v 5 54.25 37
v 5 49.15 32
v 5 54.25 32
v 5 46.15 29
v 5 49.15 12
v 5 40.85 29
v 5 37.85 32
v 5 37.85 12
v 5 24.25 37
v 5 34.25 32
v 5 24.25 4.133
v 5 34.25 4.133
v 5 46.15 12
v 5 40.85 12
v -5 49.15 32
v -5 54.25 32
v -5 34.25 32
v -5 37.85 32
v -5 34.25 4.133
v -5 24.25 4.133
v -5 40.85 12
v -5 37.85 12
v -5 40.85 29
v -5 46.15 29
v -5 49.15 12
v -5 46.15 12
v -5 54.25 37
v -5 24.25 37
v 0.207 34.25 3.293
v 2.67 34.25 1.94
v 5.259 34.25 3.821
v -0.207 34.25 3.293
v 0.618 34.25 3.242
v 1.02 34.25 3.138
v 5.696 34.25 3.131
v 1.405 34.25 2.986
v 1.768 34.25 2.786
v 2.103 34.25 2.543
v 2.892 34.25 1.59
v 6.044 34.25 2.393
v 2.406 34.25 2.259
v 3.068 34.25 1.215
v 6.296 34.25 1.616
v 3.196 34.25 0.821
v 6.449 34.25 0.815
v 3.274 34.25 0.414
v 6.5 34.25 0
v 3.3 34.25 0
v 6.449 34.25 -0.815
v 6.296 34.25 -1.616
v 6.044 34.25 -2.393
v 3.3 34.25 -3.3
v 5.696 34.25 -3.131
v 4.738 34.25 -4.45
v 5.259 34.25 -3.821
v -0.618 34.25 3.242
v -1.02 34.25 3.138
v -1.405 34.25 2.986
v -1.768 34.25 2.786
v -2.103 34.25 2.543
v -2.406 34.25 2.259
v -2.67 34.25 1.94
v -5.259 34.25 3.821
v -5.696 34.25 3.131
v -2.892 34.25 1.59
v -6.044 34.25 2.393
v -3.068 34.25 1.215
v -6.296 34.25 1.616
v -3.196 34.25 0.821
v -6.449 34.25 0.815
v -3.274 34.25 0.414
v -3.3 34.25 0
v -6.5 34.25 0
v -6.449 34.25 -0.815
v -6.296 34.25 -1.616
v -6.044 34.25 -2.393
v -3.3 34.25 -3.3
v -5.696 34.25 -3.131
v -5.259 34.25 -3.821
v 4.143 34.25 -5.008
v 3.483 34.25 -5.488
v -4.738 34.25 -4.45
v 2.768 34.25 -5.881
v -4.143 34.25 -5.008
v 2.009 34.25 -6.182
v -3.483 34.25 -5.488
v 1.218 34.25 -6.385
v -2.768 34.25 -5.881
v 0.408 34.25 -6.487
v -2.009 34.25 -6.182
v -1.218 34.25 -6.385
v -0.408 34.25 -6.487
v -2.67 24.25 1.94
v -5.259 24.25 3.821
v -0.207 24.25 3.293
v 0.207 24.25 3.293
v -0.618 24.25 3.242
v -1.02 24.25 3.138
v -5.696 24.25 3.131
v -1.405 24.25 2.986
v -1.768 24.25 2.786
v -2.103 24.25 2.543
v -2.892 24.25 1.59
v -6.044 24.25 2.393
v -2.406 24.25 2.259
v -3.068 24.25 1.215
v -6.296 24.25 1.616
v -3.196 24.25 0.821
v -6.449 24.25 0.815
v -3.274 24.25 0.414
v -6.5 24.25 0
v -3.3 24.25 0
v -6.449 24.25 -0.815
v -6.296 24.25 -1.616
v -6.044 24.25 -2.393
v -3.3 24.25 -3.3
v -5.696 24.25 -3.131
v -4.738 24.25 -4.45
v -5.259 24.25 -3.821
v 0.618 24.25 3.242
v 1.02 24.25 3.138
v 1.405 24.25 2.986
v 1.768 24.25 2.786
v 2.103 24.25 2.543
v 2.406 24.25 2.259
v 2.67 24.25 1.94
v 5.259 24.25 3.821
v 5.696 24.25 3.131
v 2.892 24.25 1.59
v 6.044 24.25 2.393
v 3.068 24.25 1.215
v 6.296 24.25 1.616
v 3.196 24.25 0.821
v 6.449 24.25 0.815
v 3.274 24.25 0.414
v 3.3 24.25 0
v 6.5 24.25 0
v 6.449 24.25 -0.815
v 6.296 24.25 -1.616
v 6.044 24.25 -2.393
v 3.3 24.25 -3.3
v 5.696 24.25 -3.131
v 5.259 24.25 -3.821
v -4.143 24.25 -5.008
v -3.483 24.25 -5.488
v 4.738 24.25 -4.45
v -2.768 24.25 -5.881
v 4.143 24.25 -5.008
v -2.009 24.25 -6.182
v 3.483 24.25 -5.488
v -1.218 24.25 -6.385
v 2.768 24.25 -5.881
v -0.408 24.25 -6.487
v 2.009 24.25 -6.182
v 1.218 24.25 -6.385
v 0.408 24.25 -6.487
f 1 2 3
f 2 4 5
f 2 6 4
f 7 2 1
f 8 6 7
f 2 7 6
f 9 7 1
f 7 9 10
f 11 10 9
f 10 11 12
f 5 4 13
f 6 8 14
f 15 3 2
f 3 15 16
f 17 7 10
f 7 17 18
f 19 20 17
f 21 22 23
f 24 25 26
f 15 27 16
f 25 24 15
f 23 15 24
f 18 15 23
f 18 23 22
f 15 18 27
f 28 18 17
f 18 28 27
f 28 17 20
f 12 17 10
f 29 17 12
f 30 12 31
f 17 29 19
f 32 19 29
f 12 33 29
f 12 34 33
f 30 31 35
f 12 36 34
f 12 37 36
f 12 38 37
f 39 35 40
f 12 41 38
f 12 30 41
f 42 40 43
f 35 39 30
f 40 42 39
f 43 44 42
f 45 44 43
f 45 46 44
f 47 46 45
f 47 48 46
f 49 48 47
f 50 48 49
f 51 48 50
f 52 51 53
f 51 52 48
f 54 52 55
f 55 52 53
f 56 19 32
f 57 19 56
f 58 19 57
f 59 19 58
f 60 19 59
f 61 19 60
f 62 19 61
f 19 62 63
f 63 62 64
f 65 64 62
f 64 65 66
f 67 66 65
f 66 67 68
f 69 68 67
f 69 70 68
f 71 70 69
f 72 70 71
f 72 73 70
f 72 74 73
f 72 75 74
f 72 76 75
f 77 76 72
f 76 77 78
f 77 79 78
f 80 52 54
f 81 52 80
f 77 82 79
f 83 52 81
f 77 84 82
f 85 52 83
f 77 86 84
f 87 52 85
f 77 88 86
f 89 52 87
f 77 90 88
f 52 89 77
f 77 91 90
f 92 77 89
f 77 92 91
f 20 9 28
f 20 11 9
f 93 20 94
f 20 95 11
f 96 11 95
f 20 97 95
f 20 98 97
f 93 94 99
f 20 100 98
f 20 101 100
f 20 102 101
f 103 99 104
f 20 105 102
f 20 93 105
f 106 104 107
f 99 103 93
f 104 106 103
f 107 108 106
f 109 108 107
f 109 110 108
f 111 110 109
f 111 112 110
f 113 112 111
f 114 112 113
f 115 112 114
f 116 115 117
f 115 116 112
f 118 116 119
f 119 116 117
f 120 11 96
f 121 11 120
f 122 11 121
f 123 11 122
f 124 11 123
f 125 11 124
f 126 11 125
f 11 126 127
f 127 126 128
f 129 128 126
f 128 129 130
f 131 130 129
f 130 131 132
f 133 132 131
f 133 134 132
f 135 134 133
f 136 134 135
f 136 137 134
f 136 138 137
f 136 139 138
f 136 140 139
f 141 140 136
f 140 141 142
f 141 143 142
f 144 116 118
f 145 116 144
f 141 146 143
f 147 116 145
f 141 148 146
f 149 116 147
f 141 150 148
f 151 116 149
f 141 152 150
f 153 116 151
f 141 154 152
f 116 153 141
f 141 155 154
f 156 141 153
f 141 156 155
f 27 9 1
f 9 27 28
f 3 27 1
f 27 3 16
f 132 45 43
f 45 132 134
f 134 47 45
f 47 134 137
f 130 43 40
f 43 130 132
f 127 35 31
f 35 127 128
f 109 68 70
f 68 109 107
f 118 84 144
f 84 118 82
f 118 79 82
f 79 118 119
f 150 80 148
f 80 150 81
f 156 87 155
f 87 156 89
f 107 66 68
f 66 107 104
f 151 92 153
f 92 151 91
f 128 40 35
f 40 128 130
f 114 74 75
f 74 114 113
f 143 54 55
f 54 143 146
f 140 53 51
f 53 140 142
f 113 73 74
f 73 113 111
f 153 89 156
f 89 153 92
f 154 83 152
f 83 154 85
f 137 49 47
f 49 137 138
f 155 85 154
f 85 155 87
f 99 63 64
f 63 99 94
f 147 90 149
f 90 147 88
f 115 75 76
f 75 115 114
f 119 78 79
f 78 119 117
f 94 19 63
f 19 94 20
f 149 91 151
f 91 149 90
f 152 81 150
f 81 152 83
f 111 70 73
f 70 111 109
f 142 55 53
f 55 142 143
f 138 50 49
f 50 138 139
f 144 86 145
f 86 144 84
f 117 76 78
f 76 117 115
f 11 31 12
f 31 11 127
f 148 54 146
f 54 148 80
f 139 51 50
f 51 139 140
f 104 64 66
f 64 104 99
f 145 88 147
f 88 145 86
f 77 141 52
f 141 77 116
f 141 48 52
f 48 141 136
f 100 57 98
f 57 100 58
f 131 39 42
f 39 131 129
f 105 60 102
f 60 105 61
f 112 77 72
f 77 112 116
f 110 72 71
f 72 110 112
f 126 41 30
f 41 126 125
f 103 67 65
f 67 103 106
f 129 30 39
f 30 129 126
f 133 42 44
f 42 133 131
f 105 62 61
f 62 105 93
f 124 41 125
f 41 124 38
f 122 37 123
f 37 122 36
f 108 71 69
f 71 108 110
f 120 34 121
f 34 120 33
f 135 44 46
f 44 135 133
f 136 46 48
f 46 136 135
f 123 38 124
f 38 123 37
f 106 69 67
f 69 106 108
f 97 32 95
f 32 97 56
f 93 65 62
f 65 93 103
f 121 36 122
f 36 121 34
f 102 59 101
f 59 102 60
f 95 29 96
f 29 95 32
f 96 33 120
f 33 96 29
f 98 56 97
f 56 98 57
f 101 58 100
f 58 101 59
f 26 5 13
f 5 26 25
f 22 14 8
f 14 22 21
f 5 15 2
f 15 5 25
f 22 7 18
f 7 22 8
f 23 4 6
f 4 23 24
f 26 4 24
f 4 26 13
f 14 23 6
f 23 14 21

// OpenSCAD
$fn = 50;

gap = 1;
wall = 3;
electrode_sz_z = 32;

max_sz_y = 86.5;

h=max_sz_y - 2 * wall - 2 * gap - 10;

int_d = 2;
ext_d = int_d + 4;

holder_d = ext_d + 2 * wall + gap;
holder_sz_y = 10;

module isolat(extra_d=0) {
  d = ext_d+extra_d;
  rotate([90, 0, 0]) {
    difference() {
      union() {
        cylinder(d=d, h=h, center=true);
        translate([0, -d/4, 0]) {
          cube([d, d/2, h], center=true);
        }
      }
      translate([0, 0, wall*2]) {
        cylinder(d=int_d, h=h, center=true);
      }
    }
  }
}


module hook() {
  difference() {
    translate([0, holder_sz_y-h/2-wall, 0]) {
      difference() {
        union() {
          rotate([90, 0, 0]) {
            cylinder(d=holder_d, h=holder_sz_y);
          }
          translate([0, (wall-holder_d)/2, electrode_sz_z/2]) {
            cube([4+2*wall, holder_sz_y, electrode_sz_z], center=true);
            translate([0, -15+holder_sz_y/2, (electrode_sz_z+5)/2]) {
              difference() {
                cube([4+2*wall, 30, 5], center=true);
                translate([0, -7.5, 0]) {
                  cylinder(d=3.2, h=40, center=true);
                }
              }
            }
          }
        }
        translate([0, -holder_sz_y, electrode_sz_z/2+5]) {
          cube([4, holder_sz_y, electrode_sz_z+10], center=true);
        }
      }
    }
    hull() {
      isolat(0.6);
    }
  }
}

module holder_hook() {
  difference() {
    translate([0, holder_sz_y-h/2-wall, 0]) {
      difference() {
        union() {
          rotate([90, 0, 0]) {
            cylinder(d=holder_d, h=holder_sz_y);
          }
          translate([0, (wall-holder_d)/2, electrode_sz_z/2]) {
            cube([4+2*wall, holder_sz_y, electrode_sz_z], center=true);
            translate([0, +15-holder_sz_y/2, (electrode_sz_z+5)/2]) {
              difference() {
                cube([4+2*wall, 30, 5], center=true);
              }
            }
          }
        }
      }
    }
    translate([0, -10, 0]) {
        hull() {
          isolat(0.6);
        }
    }
  }
  translate([0, -18, 22]) {
    difference() {
      union() {
        cube([4+2*wall, 2*wall+5.3, 20], center=true);
      }
      translate([0, 0, -wall]) {
        cube([4+2*wall, 5.3, 20], center=true);
      }
    }
  }
}

module socket() {
  difference() {
    union() {
      cube([4+2*wall, 15.5, wall], center=true);
      translate([0, -7.75+wall/2, 7.5]) {
        cube([4+2*wall, wall, 15], center=true);
      }
    }
    translate([0, 3, 0]) {
      cylinder(d=4, h=40, center=true);
    }
    translate([0, 0, 10]) {
      rotate([90, 0, 0]) {
        cylinder(d=4, h=40, center=true);
      }
    }
  }
}

module lock() {
  difference() {
    union() {
      // top
      translate([0, -4.25, 10]) {
        cube([4+2*wall, 18, wall], center=true);
      }
      cube([4+2*wall, 2*wall+3.4, 20], center=true);
    }
    translate([0, 0, -wall/2]) {
      cube([4+2*wall, 3.4, 20], center=true);
    }
    translate([0, -7, 0]) {
      cylinder(d=3.2, h=50, center=true);
    }
  }
}


//isolat();
translate([0, holder_sz_y-h+9-3, electrode_sz_z+wall/2+2+wall]) {
//  socket();
}
//hook();
translate([0, h-7, 0]) {
  holder_hook();
}
translate([0, holder_sz_y-h+16, electrode_sz_z-12]) {
//  lock();
}
